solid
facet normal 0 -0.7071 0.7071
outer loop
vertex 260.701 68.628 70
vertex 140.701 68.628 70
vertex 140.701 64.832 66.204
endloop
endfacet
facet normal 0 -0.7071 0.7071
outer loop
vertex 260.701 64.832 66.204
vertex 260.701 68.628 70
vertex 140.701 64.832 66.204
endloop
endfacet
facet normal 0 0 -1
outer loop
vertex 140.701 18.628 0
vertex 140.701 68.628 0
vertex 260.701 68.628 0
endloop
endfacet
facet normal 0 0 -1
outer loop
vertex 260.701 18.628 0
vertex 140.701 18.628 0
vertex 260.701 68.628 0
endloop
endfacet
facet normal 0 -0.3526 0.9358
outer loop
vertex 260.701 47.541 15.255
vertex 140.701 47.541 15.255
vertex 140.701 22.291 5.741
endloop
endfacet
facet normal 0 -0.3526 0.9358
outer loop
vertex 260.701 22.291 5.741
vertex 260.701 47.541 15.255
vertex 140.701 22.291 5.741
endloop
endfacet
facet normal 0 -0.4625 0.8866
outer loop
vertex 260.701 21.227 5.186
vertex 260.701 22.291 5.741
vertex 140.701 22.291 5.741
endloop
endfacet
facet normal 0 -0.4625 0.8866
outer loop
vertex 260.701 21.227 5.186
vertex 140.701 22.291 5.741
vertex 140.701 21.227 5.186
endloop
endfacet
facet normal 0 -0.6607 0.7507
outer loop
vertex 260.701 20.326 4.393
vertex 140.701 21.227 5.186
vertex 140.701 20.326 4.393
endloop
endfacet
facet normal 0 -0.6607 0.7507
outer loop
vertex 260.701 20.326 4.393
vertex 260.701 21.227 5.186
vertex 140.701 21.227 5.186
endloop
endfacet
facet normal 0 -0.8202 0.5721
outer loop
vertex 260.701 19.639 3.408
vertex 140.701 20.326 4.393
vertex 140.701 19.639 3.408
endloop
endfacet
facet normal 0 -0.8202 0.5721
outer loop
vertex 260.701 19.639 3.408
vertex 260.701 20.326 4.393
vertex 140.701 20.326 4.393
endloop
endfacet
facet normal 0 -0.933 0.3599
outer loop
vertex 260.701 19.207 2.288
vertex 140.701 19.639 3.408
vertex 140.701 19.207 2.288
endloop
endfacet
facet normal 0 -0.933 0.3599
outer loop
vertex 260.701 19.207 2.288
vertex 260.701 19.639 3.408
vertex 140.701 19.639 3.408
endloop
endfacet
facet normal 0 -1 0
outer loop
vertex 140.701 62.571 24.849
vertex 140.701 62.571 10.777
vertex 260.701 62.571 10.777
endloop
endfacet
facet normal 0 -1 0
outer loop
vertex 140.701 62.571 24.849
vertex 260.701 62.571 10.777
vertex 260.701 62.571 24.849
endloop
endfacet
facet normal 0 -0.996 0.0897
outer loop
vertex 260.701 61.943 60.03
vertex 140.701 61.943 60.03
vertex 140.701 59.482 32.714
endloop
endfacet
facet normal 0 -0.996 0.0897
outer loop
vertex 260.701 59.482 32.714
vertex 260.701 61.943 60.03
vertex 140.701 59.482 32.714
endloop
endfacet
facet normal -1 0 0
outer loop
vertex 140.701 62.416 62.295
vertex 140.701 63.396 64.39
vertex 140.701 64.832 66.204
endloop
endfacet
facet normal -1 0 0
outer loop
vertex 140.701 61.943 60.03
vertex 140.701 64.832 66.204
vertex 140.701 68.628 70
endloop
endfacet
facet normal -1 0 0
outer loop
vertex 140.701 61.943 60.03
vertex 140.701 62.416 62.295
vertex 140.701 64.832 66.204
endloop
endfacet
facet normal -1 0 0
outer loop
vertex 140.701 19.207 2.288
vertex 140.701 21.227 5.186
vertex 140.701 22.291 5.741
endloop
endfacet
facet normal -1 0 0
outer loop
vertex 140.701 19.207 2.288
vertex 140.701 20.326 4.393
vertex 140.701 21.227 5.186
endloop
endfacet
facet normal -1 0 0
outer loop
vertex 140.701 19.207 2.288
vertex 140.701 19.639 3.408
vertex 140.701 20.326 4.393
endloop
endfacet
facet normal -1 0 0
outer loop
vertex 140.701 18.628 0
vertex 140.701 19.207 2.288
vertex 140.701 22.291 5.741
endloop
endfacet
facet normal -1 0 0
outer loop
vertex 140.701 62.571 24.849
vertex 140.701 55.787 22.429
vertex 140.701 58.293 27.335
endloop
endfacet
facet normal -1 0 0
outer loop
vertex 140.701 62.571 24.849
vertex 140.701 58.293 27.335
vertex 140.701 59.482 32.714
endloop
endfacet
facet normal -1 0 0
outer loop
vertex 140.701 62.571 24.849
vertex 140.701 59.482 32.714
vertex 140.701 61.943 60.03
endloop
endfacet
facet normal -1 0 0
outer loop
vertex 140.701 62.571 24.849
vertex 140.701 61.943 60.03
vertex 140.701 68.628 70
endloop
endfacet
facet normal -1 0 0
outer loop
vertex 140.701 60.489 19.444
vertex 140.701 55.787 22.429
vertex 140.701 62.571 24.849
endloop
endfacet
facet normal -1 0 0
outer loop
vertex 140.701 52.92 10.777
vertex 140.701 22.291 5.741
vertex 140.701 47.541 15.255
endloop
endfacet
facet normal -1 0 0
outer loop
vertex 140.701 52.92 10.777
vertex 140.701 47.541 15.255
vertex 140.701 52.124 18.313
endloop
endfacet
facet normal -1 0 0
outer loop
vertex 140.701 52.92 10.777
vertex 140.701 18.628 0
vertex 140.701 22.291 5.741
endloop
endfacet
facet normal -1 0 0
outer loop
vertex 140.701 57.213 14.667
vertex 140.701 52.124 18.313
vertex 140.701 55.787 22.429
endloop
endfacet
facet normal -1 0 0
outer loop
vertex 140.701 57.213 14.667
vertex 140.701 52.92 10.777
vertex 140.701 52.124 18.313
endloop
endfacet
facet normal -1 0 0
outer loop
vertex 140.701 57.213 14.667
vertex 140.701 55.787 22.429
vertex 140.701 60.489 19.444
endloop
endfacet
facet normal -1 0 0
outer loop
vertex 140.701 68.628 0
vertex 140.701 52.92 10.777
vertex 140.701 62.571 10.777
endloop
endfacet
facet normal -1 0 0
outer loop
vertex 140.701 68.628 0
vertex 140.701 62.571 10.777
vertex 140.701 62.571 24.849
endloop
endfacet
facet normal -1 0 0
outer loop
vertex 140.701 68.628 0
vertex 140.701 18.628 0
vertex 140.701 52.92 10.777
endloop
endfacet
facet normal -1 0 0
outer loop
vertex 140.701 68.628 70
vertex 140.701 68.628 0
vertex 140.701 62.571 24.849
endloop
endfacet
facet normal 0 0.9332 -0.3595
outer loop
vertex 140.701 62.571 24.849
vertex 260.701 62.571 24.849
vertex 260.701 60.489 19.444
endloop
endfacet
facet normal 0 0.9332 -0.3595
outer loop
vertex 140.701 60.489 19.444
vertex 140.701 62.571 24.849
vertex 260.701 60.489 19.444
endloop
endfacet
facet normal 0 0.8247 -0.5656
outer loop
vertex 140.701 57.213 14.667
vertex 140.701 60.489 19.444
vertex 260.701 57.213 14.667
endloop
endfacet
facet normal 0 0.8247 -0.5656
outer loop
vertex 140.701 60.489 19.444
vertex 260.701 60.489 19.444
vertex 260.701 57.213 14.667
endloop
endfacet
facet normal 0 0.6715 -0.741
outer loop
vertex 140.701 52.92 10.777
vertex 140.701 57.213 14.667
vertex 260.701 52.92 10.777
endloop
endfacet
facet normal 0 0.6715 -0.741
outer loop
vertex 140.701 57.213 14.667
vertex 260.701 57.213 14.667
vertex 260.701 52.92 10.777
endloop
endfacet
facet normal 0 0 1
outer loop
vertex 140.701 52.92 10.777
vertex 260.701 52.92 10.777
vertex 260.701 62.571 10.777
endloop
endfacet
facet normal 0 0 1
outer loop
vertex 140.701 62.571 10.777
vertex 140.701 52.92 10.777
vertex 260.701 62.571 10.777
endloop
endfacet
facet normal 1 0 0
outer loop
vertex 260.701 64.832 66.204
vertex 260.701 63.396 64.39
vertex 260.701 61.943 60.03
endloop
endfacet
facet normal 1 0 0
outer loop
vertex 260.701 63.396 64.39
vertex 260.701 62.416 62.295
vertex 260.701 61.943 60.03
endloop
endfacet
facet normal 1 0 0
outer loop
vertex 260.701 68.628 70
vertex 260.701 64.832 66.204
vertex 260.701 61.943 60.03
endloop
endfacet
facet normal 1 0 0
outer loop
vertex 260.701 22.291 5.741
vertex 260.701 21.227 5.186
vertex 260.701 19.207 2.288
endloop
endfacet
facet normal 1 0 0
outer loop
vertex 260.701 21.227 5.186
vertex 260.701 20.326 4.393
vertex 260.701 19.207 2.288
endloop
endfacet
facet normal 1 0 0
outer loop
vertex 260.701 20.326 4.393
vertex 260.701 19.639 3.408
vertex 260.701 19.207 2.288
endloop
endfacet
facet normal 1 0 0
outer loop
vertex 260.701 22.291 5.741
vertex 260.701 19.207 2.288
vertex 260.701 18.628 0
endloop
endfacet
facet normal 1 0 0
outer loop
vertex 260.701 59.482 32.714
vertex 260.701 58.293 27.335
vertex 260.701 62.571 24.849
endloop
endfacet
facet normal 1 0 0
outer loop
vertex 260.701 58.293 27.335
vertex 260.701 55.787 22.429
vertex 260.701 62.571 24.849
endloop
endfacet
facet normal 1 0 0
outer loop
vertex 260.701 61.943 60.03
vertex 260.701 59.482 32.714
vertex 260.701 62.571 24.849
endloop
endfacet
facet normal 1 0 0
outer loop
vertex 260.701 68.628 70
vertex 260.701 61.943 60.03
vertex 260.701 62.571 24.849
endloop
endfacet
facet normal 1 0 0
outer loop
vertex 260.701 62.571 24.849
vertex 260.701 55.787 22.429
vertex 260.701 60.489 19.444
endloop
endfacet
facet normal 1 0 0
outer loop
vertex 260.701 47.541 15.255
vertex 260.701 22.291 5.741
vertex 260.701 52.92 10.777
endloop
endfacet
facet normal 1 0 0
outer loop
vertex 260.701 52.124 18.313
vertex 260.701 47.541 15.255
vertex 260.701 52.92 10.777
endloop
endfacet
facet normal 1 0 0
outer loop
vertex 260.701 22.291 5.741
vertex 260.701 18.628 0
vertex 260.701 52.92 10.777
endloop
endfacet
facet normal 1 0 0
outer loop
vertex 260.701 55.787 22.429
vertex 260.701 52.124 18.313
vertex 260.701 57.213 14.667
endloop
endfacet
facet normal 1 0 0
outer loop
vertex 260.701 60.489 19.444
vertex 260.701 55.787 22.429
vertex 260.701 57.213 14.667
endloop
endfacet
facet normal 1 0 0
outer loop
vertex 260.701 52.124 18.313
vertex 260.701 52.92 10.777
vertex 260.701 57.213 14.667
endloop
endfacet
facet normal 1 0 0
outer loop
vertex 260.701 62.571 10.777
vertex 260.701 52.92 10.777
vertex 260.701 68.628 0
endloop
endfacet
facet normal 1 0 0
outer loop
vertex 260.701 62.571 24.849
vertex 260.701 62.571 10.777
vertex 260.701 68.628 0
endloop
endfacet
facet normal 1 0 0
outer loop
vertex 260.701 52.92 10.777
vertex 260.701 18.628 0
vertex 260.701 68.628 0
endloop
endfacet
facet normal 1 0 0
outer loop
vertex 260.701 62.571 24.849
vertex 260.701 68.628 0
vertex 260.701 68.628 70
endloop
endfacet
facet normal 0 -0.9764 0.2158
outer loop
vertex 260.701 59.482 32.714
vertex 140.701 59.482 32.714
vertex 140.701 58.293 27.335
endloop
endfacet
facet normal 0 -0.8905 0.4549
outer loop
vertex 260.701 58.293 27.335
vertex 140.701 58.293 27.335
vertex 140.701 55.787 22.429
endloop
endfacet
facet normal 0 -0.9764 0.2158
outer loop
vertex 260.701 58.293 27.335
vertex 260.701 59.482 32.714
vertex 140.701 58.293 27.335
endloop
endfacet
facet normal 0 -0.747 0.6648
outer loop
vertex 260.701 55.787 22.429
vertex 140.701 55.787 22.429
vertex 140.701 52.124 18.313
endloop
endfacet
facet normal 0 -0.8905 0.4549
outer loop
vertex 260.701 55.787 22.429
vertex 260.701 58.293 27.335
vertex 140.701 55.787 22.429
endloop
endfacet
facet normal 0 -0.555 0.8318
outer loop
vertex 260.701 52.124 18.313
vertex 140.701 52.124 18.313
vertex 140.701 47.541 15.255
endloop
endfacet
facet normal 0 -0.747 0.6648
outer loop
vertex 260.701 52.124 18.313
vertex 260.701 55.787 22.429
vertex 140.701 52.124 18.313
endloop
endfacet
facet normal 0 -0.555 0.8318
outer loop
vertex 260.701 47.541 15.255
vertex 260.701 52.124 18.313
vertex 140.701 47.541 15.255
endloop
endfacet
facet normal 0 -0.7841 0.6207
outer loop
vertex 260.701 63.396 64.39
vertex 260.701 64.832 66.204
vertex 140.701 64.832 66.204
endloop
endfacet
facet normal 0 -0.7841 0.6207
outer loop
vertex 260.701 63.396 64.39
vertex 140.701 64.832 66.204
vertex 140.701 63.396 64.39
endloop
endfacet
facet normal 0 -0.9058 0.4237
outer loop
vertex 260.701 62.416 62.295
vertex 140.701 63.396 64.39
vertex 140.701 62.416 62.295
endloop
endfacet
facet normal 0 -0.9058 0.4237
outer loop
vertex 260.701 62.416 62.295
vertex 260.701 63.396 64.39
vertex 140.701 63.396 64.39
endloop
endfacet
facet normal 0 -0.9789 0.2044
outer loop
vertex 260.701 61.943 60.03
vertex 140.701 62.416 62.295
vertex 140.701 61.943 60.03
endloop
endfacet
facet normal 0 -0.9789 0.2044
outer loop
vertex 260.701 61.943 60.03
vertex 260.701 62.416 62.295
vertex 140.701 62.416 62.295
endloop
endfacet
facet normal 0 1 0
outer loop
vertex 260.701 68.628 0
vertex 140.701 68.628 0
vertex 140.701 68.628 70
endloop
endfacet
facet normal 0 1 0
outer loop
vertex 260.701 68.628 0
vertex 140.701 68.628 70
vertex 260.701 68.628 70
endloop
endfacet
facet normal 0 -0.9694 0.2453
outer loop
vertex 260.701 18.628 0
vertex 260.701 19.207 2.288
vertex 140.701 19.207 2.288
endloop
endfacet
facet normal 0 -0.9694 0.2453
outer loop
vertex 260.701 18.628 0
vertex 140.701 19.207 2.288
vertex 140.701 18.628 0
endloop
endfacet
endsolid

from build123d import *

# Parameters (mm, degrees)
CROQUIS1_W              = 120
CROQUIS1_H              = 50
SALIENTE_EXTRUIR1_DEPTH = 70
CORTAR_EXTRUIR1_DEPTH   = 121


with BuildPart() as part:
    # Croquis1 → Saliente-Extruir1 (new body)
    with BuildSketch(Plane.XY):
        with Locations((200.700947131, 43.628006873)):
            Rectangle(CROQUIS1_W, CROQUIS1_H)
    extrude(amount=SALIENTE_EXTRUIR1_DEPTH)

    # Croquis2 → Cortar-Extruir1 (cut)
    with BuildSketch(Plane(origin=(260.700947131, 0, 0), x_dir=(0, 0, -1), z_dir=(1, 0, 0))):
        with BuildLine():
            Line((-70, 68.628006873), (-66.203930164, 64.831937037))
            ThreePointArc((-66.203930164, 64.831937037), (-63.370887429, 62.845458633), (-60.030458687, 61.943370276))
            Line((-60.030458687, 61.943370276), (-32.714126266, 59.481528961))
            ThreePointArc((-32.714126266, 59.481528961), (-22.428502516, 55.786756469), (-15.255184219, 47.541218021))
            Line((-15.255184219, 47.541218021), (-5.740714687, 22.291279647))
            ThreePointArc((-5.740714687, 22.291279647), (-4.393024365, 20.325605767), (-2.288474759, 19.207118412))
            Line((-2.288474759, 19.207118412), (0, 18.628006873))
            Line((0, 18.628006873), (-70, 18.628006873))
            Line((-70, 18.628006873), (-70, 68.628006873))
        make_face()
        with BuildLine():
            Line((-10.777042467, 52.920195468), (-10.777042467, 62.571113796))
            Line((-10.777042467, 62.571113796), (-24.848704029, 62.571113796))
            ThreePointArc((-24.848704029, 62.571113796), (-16.959352467, 58.990142997), (-10.777042467, 52.920195468))
        make_face()
    extrude(amount=-CORTAR_EXTRUIR1_DEPTH, mode=Mode.SUBTRACT)


solid = part.part
